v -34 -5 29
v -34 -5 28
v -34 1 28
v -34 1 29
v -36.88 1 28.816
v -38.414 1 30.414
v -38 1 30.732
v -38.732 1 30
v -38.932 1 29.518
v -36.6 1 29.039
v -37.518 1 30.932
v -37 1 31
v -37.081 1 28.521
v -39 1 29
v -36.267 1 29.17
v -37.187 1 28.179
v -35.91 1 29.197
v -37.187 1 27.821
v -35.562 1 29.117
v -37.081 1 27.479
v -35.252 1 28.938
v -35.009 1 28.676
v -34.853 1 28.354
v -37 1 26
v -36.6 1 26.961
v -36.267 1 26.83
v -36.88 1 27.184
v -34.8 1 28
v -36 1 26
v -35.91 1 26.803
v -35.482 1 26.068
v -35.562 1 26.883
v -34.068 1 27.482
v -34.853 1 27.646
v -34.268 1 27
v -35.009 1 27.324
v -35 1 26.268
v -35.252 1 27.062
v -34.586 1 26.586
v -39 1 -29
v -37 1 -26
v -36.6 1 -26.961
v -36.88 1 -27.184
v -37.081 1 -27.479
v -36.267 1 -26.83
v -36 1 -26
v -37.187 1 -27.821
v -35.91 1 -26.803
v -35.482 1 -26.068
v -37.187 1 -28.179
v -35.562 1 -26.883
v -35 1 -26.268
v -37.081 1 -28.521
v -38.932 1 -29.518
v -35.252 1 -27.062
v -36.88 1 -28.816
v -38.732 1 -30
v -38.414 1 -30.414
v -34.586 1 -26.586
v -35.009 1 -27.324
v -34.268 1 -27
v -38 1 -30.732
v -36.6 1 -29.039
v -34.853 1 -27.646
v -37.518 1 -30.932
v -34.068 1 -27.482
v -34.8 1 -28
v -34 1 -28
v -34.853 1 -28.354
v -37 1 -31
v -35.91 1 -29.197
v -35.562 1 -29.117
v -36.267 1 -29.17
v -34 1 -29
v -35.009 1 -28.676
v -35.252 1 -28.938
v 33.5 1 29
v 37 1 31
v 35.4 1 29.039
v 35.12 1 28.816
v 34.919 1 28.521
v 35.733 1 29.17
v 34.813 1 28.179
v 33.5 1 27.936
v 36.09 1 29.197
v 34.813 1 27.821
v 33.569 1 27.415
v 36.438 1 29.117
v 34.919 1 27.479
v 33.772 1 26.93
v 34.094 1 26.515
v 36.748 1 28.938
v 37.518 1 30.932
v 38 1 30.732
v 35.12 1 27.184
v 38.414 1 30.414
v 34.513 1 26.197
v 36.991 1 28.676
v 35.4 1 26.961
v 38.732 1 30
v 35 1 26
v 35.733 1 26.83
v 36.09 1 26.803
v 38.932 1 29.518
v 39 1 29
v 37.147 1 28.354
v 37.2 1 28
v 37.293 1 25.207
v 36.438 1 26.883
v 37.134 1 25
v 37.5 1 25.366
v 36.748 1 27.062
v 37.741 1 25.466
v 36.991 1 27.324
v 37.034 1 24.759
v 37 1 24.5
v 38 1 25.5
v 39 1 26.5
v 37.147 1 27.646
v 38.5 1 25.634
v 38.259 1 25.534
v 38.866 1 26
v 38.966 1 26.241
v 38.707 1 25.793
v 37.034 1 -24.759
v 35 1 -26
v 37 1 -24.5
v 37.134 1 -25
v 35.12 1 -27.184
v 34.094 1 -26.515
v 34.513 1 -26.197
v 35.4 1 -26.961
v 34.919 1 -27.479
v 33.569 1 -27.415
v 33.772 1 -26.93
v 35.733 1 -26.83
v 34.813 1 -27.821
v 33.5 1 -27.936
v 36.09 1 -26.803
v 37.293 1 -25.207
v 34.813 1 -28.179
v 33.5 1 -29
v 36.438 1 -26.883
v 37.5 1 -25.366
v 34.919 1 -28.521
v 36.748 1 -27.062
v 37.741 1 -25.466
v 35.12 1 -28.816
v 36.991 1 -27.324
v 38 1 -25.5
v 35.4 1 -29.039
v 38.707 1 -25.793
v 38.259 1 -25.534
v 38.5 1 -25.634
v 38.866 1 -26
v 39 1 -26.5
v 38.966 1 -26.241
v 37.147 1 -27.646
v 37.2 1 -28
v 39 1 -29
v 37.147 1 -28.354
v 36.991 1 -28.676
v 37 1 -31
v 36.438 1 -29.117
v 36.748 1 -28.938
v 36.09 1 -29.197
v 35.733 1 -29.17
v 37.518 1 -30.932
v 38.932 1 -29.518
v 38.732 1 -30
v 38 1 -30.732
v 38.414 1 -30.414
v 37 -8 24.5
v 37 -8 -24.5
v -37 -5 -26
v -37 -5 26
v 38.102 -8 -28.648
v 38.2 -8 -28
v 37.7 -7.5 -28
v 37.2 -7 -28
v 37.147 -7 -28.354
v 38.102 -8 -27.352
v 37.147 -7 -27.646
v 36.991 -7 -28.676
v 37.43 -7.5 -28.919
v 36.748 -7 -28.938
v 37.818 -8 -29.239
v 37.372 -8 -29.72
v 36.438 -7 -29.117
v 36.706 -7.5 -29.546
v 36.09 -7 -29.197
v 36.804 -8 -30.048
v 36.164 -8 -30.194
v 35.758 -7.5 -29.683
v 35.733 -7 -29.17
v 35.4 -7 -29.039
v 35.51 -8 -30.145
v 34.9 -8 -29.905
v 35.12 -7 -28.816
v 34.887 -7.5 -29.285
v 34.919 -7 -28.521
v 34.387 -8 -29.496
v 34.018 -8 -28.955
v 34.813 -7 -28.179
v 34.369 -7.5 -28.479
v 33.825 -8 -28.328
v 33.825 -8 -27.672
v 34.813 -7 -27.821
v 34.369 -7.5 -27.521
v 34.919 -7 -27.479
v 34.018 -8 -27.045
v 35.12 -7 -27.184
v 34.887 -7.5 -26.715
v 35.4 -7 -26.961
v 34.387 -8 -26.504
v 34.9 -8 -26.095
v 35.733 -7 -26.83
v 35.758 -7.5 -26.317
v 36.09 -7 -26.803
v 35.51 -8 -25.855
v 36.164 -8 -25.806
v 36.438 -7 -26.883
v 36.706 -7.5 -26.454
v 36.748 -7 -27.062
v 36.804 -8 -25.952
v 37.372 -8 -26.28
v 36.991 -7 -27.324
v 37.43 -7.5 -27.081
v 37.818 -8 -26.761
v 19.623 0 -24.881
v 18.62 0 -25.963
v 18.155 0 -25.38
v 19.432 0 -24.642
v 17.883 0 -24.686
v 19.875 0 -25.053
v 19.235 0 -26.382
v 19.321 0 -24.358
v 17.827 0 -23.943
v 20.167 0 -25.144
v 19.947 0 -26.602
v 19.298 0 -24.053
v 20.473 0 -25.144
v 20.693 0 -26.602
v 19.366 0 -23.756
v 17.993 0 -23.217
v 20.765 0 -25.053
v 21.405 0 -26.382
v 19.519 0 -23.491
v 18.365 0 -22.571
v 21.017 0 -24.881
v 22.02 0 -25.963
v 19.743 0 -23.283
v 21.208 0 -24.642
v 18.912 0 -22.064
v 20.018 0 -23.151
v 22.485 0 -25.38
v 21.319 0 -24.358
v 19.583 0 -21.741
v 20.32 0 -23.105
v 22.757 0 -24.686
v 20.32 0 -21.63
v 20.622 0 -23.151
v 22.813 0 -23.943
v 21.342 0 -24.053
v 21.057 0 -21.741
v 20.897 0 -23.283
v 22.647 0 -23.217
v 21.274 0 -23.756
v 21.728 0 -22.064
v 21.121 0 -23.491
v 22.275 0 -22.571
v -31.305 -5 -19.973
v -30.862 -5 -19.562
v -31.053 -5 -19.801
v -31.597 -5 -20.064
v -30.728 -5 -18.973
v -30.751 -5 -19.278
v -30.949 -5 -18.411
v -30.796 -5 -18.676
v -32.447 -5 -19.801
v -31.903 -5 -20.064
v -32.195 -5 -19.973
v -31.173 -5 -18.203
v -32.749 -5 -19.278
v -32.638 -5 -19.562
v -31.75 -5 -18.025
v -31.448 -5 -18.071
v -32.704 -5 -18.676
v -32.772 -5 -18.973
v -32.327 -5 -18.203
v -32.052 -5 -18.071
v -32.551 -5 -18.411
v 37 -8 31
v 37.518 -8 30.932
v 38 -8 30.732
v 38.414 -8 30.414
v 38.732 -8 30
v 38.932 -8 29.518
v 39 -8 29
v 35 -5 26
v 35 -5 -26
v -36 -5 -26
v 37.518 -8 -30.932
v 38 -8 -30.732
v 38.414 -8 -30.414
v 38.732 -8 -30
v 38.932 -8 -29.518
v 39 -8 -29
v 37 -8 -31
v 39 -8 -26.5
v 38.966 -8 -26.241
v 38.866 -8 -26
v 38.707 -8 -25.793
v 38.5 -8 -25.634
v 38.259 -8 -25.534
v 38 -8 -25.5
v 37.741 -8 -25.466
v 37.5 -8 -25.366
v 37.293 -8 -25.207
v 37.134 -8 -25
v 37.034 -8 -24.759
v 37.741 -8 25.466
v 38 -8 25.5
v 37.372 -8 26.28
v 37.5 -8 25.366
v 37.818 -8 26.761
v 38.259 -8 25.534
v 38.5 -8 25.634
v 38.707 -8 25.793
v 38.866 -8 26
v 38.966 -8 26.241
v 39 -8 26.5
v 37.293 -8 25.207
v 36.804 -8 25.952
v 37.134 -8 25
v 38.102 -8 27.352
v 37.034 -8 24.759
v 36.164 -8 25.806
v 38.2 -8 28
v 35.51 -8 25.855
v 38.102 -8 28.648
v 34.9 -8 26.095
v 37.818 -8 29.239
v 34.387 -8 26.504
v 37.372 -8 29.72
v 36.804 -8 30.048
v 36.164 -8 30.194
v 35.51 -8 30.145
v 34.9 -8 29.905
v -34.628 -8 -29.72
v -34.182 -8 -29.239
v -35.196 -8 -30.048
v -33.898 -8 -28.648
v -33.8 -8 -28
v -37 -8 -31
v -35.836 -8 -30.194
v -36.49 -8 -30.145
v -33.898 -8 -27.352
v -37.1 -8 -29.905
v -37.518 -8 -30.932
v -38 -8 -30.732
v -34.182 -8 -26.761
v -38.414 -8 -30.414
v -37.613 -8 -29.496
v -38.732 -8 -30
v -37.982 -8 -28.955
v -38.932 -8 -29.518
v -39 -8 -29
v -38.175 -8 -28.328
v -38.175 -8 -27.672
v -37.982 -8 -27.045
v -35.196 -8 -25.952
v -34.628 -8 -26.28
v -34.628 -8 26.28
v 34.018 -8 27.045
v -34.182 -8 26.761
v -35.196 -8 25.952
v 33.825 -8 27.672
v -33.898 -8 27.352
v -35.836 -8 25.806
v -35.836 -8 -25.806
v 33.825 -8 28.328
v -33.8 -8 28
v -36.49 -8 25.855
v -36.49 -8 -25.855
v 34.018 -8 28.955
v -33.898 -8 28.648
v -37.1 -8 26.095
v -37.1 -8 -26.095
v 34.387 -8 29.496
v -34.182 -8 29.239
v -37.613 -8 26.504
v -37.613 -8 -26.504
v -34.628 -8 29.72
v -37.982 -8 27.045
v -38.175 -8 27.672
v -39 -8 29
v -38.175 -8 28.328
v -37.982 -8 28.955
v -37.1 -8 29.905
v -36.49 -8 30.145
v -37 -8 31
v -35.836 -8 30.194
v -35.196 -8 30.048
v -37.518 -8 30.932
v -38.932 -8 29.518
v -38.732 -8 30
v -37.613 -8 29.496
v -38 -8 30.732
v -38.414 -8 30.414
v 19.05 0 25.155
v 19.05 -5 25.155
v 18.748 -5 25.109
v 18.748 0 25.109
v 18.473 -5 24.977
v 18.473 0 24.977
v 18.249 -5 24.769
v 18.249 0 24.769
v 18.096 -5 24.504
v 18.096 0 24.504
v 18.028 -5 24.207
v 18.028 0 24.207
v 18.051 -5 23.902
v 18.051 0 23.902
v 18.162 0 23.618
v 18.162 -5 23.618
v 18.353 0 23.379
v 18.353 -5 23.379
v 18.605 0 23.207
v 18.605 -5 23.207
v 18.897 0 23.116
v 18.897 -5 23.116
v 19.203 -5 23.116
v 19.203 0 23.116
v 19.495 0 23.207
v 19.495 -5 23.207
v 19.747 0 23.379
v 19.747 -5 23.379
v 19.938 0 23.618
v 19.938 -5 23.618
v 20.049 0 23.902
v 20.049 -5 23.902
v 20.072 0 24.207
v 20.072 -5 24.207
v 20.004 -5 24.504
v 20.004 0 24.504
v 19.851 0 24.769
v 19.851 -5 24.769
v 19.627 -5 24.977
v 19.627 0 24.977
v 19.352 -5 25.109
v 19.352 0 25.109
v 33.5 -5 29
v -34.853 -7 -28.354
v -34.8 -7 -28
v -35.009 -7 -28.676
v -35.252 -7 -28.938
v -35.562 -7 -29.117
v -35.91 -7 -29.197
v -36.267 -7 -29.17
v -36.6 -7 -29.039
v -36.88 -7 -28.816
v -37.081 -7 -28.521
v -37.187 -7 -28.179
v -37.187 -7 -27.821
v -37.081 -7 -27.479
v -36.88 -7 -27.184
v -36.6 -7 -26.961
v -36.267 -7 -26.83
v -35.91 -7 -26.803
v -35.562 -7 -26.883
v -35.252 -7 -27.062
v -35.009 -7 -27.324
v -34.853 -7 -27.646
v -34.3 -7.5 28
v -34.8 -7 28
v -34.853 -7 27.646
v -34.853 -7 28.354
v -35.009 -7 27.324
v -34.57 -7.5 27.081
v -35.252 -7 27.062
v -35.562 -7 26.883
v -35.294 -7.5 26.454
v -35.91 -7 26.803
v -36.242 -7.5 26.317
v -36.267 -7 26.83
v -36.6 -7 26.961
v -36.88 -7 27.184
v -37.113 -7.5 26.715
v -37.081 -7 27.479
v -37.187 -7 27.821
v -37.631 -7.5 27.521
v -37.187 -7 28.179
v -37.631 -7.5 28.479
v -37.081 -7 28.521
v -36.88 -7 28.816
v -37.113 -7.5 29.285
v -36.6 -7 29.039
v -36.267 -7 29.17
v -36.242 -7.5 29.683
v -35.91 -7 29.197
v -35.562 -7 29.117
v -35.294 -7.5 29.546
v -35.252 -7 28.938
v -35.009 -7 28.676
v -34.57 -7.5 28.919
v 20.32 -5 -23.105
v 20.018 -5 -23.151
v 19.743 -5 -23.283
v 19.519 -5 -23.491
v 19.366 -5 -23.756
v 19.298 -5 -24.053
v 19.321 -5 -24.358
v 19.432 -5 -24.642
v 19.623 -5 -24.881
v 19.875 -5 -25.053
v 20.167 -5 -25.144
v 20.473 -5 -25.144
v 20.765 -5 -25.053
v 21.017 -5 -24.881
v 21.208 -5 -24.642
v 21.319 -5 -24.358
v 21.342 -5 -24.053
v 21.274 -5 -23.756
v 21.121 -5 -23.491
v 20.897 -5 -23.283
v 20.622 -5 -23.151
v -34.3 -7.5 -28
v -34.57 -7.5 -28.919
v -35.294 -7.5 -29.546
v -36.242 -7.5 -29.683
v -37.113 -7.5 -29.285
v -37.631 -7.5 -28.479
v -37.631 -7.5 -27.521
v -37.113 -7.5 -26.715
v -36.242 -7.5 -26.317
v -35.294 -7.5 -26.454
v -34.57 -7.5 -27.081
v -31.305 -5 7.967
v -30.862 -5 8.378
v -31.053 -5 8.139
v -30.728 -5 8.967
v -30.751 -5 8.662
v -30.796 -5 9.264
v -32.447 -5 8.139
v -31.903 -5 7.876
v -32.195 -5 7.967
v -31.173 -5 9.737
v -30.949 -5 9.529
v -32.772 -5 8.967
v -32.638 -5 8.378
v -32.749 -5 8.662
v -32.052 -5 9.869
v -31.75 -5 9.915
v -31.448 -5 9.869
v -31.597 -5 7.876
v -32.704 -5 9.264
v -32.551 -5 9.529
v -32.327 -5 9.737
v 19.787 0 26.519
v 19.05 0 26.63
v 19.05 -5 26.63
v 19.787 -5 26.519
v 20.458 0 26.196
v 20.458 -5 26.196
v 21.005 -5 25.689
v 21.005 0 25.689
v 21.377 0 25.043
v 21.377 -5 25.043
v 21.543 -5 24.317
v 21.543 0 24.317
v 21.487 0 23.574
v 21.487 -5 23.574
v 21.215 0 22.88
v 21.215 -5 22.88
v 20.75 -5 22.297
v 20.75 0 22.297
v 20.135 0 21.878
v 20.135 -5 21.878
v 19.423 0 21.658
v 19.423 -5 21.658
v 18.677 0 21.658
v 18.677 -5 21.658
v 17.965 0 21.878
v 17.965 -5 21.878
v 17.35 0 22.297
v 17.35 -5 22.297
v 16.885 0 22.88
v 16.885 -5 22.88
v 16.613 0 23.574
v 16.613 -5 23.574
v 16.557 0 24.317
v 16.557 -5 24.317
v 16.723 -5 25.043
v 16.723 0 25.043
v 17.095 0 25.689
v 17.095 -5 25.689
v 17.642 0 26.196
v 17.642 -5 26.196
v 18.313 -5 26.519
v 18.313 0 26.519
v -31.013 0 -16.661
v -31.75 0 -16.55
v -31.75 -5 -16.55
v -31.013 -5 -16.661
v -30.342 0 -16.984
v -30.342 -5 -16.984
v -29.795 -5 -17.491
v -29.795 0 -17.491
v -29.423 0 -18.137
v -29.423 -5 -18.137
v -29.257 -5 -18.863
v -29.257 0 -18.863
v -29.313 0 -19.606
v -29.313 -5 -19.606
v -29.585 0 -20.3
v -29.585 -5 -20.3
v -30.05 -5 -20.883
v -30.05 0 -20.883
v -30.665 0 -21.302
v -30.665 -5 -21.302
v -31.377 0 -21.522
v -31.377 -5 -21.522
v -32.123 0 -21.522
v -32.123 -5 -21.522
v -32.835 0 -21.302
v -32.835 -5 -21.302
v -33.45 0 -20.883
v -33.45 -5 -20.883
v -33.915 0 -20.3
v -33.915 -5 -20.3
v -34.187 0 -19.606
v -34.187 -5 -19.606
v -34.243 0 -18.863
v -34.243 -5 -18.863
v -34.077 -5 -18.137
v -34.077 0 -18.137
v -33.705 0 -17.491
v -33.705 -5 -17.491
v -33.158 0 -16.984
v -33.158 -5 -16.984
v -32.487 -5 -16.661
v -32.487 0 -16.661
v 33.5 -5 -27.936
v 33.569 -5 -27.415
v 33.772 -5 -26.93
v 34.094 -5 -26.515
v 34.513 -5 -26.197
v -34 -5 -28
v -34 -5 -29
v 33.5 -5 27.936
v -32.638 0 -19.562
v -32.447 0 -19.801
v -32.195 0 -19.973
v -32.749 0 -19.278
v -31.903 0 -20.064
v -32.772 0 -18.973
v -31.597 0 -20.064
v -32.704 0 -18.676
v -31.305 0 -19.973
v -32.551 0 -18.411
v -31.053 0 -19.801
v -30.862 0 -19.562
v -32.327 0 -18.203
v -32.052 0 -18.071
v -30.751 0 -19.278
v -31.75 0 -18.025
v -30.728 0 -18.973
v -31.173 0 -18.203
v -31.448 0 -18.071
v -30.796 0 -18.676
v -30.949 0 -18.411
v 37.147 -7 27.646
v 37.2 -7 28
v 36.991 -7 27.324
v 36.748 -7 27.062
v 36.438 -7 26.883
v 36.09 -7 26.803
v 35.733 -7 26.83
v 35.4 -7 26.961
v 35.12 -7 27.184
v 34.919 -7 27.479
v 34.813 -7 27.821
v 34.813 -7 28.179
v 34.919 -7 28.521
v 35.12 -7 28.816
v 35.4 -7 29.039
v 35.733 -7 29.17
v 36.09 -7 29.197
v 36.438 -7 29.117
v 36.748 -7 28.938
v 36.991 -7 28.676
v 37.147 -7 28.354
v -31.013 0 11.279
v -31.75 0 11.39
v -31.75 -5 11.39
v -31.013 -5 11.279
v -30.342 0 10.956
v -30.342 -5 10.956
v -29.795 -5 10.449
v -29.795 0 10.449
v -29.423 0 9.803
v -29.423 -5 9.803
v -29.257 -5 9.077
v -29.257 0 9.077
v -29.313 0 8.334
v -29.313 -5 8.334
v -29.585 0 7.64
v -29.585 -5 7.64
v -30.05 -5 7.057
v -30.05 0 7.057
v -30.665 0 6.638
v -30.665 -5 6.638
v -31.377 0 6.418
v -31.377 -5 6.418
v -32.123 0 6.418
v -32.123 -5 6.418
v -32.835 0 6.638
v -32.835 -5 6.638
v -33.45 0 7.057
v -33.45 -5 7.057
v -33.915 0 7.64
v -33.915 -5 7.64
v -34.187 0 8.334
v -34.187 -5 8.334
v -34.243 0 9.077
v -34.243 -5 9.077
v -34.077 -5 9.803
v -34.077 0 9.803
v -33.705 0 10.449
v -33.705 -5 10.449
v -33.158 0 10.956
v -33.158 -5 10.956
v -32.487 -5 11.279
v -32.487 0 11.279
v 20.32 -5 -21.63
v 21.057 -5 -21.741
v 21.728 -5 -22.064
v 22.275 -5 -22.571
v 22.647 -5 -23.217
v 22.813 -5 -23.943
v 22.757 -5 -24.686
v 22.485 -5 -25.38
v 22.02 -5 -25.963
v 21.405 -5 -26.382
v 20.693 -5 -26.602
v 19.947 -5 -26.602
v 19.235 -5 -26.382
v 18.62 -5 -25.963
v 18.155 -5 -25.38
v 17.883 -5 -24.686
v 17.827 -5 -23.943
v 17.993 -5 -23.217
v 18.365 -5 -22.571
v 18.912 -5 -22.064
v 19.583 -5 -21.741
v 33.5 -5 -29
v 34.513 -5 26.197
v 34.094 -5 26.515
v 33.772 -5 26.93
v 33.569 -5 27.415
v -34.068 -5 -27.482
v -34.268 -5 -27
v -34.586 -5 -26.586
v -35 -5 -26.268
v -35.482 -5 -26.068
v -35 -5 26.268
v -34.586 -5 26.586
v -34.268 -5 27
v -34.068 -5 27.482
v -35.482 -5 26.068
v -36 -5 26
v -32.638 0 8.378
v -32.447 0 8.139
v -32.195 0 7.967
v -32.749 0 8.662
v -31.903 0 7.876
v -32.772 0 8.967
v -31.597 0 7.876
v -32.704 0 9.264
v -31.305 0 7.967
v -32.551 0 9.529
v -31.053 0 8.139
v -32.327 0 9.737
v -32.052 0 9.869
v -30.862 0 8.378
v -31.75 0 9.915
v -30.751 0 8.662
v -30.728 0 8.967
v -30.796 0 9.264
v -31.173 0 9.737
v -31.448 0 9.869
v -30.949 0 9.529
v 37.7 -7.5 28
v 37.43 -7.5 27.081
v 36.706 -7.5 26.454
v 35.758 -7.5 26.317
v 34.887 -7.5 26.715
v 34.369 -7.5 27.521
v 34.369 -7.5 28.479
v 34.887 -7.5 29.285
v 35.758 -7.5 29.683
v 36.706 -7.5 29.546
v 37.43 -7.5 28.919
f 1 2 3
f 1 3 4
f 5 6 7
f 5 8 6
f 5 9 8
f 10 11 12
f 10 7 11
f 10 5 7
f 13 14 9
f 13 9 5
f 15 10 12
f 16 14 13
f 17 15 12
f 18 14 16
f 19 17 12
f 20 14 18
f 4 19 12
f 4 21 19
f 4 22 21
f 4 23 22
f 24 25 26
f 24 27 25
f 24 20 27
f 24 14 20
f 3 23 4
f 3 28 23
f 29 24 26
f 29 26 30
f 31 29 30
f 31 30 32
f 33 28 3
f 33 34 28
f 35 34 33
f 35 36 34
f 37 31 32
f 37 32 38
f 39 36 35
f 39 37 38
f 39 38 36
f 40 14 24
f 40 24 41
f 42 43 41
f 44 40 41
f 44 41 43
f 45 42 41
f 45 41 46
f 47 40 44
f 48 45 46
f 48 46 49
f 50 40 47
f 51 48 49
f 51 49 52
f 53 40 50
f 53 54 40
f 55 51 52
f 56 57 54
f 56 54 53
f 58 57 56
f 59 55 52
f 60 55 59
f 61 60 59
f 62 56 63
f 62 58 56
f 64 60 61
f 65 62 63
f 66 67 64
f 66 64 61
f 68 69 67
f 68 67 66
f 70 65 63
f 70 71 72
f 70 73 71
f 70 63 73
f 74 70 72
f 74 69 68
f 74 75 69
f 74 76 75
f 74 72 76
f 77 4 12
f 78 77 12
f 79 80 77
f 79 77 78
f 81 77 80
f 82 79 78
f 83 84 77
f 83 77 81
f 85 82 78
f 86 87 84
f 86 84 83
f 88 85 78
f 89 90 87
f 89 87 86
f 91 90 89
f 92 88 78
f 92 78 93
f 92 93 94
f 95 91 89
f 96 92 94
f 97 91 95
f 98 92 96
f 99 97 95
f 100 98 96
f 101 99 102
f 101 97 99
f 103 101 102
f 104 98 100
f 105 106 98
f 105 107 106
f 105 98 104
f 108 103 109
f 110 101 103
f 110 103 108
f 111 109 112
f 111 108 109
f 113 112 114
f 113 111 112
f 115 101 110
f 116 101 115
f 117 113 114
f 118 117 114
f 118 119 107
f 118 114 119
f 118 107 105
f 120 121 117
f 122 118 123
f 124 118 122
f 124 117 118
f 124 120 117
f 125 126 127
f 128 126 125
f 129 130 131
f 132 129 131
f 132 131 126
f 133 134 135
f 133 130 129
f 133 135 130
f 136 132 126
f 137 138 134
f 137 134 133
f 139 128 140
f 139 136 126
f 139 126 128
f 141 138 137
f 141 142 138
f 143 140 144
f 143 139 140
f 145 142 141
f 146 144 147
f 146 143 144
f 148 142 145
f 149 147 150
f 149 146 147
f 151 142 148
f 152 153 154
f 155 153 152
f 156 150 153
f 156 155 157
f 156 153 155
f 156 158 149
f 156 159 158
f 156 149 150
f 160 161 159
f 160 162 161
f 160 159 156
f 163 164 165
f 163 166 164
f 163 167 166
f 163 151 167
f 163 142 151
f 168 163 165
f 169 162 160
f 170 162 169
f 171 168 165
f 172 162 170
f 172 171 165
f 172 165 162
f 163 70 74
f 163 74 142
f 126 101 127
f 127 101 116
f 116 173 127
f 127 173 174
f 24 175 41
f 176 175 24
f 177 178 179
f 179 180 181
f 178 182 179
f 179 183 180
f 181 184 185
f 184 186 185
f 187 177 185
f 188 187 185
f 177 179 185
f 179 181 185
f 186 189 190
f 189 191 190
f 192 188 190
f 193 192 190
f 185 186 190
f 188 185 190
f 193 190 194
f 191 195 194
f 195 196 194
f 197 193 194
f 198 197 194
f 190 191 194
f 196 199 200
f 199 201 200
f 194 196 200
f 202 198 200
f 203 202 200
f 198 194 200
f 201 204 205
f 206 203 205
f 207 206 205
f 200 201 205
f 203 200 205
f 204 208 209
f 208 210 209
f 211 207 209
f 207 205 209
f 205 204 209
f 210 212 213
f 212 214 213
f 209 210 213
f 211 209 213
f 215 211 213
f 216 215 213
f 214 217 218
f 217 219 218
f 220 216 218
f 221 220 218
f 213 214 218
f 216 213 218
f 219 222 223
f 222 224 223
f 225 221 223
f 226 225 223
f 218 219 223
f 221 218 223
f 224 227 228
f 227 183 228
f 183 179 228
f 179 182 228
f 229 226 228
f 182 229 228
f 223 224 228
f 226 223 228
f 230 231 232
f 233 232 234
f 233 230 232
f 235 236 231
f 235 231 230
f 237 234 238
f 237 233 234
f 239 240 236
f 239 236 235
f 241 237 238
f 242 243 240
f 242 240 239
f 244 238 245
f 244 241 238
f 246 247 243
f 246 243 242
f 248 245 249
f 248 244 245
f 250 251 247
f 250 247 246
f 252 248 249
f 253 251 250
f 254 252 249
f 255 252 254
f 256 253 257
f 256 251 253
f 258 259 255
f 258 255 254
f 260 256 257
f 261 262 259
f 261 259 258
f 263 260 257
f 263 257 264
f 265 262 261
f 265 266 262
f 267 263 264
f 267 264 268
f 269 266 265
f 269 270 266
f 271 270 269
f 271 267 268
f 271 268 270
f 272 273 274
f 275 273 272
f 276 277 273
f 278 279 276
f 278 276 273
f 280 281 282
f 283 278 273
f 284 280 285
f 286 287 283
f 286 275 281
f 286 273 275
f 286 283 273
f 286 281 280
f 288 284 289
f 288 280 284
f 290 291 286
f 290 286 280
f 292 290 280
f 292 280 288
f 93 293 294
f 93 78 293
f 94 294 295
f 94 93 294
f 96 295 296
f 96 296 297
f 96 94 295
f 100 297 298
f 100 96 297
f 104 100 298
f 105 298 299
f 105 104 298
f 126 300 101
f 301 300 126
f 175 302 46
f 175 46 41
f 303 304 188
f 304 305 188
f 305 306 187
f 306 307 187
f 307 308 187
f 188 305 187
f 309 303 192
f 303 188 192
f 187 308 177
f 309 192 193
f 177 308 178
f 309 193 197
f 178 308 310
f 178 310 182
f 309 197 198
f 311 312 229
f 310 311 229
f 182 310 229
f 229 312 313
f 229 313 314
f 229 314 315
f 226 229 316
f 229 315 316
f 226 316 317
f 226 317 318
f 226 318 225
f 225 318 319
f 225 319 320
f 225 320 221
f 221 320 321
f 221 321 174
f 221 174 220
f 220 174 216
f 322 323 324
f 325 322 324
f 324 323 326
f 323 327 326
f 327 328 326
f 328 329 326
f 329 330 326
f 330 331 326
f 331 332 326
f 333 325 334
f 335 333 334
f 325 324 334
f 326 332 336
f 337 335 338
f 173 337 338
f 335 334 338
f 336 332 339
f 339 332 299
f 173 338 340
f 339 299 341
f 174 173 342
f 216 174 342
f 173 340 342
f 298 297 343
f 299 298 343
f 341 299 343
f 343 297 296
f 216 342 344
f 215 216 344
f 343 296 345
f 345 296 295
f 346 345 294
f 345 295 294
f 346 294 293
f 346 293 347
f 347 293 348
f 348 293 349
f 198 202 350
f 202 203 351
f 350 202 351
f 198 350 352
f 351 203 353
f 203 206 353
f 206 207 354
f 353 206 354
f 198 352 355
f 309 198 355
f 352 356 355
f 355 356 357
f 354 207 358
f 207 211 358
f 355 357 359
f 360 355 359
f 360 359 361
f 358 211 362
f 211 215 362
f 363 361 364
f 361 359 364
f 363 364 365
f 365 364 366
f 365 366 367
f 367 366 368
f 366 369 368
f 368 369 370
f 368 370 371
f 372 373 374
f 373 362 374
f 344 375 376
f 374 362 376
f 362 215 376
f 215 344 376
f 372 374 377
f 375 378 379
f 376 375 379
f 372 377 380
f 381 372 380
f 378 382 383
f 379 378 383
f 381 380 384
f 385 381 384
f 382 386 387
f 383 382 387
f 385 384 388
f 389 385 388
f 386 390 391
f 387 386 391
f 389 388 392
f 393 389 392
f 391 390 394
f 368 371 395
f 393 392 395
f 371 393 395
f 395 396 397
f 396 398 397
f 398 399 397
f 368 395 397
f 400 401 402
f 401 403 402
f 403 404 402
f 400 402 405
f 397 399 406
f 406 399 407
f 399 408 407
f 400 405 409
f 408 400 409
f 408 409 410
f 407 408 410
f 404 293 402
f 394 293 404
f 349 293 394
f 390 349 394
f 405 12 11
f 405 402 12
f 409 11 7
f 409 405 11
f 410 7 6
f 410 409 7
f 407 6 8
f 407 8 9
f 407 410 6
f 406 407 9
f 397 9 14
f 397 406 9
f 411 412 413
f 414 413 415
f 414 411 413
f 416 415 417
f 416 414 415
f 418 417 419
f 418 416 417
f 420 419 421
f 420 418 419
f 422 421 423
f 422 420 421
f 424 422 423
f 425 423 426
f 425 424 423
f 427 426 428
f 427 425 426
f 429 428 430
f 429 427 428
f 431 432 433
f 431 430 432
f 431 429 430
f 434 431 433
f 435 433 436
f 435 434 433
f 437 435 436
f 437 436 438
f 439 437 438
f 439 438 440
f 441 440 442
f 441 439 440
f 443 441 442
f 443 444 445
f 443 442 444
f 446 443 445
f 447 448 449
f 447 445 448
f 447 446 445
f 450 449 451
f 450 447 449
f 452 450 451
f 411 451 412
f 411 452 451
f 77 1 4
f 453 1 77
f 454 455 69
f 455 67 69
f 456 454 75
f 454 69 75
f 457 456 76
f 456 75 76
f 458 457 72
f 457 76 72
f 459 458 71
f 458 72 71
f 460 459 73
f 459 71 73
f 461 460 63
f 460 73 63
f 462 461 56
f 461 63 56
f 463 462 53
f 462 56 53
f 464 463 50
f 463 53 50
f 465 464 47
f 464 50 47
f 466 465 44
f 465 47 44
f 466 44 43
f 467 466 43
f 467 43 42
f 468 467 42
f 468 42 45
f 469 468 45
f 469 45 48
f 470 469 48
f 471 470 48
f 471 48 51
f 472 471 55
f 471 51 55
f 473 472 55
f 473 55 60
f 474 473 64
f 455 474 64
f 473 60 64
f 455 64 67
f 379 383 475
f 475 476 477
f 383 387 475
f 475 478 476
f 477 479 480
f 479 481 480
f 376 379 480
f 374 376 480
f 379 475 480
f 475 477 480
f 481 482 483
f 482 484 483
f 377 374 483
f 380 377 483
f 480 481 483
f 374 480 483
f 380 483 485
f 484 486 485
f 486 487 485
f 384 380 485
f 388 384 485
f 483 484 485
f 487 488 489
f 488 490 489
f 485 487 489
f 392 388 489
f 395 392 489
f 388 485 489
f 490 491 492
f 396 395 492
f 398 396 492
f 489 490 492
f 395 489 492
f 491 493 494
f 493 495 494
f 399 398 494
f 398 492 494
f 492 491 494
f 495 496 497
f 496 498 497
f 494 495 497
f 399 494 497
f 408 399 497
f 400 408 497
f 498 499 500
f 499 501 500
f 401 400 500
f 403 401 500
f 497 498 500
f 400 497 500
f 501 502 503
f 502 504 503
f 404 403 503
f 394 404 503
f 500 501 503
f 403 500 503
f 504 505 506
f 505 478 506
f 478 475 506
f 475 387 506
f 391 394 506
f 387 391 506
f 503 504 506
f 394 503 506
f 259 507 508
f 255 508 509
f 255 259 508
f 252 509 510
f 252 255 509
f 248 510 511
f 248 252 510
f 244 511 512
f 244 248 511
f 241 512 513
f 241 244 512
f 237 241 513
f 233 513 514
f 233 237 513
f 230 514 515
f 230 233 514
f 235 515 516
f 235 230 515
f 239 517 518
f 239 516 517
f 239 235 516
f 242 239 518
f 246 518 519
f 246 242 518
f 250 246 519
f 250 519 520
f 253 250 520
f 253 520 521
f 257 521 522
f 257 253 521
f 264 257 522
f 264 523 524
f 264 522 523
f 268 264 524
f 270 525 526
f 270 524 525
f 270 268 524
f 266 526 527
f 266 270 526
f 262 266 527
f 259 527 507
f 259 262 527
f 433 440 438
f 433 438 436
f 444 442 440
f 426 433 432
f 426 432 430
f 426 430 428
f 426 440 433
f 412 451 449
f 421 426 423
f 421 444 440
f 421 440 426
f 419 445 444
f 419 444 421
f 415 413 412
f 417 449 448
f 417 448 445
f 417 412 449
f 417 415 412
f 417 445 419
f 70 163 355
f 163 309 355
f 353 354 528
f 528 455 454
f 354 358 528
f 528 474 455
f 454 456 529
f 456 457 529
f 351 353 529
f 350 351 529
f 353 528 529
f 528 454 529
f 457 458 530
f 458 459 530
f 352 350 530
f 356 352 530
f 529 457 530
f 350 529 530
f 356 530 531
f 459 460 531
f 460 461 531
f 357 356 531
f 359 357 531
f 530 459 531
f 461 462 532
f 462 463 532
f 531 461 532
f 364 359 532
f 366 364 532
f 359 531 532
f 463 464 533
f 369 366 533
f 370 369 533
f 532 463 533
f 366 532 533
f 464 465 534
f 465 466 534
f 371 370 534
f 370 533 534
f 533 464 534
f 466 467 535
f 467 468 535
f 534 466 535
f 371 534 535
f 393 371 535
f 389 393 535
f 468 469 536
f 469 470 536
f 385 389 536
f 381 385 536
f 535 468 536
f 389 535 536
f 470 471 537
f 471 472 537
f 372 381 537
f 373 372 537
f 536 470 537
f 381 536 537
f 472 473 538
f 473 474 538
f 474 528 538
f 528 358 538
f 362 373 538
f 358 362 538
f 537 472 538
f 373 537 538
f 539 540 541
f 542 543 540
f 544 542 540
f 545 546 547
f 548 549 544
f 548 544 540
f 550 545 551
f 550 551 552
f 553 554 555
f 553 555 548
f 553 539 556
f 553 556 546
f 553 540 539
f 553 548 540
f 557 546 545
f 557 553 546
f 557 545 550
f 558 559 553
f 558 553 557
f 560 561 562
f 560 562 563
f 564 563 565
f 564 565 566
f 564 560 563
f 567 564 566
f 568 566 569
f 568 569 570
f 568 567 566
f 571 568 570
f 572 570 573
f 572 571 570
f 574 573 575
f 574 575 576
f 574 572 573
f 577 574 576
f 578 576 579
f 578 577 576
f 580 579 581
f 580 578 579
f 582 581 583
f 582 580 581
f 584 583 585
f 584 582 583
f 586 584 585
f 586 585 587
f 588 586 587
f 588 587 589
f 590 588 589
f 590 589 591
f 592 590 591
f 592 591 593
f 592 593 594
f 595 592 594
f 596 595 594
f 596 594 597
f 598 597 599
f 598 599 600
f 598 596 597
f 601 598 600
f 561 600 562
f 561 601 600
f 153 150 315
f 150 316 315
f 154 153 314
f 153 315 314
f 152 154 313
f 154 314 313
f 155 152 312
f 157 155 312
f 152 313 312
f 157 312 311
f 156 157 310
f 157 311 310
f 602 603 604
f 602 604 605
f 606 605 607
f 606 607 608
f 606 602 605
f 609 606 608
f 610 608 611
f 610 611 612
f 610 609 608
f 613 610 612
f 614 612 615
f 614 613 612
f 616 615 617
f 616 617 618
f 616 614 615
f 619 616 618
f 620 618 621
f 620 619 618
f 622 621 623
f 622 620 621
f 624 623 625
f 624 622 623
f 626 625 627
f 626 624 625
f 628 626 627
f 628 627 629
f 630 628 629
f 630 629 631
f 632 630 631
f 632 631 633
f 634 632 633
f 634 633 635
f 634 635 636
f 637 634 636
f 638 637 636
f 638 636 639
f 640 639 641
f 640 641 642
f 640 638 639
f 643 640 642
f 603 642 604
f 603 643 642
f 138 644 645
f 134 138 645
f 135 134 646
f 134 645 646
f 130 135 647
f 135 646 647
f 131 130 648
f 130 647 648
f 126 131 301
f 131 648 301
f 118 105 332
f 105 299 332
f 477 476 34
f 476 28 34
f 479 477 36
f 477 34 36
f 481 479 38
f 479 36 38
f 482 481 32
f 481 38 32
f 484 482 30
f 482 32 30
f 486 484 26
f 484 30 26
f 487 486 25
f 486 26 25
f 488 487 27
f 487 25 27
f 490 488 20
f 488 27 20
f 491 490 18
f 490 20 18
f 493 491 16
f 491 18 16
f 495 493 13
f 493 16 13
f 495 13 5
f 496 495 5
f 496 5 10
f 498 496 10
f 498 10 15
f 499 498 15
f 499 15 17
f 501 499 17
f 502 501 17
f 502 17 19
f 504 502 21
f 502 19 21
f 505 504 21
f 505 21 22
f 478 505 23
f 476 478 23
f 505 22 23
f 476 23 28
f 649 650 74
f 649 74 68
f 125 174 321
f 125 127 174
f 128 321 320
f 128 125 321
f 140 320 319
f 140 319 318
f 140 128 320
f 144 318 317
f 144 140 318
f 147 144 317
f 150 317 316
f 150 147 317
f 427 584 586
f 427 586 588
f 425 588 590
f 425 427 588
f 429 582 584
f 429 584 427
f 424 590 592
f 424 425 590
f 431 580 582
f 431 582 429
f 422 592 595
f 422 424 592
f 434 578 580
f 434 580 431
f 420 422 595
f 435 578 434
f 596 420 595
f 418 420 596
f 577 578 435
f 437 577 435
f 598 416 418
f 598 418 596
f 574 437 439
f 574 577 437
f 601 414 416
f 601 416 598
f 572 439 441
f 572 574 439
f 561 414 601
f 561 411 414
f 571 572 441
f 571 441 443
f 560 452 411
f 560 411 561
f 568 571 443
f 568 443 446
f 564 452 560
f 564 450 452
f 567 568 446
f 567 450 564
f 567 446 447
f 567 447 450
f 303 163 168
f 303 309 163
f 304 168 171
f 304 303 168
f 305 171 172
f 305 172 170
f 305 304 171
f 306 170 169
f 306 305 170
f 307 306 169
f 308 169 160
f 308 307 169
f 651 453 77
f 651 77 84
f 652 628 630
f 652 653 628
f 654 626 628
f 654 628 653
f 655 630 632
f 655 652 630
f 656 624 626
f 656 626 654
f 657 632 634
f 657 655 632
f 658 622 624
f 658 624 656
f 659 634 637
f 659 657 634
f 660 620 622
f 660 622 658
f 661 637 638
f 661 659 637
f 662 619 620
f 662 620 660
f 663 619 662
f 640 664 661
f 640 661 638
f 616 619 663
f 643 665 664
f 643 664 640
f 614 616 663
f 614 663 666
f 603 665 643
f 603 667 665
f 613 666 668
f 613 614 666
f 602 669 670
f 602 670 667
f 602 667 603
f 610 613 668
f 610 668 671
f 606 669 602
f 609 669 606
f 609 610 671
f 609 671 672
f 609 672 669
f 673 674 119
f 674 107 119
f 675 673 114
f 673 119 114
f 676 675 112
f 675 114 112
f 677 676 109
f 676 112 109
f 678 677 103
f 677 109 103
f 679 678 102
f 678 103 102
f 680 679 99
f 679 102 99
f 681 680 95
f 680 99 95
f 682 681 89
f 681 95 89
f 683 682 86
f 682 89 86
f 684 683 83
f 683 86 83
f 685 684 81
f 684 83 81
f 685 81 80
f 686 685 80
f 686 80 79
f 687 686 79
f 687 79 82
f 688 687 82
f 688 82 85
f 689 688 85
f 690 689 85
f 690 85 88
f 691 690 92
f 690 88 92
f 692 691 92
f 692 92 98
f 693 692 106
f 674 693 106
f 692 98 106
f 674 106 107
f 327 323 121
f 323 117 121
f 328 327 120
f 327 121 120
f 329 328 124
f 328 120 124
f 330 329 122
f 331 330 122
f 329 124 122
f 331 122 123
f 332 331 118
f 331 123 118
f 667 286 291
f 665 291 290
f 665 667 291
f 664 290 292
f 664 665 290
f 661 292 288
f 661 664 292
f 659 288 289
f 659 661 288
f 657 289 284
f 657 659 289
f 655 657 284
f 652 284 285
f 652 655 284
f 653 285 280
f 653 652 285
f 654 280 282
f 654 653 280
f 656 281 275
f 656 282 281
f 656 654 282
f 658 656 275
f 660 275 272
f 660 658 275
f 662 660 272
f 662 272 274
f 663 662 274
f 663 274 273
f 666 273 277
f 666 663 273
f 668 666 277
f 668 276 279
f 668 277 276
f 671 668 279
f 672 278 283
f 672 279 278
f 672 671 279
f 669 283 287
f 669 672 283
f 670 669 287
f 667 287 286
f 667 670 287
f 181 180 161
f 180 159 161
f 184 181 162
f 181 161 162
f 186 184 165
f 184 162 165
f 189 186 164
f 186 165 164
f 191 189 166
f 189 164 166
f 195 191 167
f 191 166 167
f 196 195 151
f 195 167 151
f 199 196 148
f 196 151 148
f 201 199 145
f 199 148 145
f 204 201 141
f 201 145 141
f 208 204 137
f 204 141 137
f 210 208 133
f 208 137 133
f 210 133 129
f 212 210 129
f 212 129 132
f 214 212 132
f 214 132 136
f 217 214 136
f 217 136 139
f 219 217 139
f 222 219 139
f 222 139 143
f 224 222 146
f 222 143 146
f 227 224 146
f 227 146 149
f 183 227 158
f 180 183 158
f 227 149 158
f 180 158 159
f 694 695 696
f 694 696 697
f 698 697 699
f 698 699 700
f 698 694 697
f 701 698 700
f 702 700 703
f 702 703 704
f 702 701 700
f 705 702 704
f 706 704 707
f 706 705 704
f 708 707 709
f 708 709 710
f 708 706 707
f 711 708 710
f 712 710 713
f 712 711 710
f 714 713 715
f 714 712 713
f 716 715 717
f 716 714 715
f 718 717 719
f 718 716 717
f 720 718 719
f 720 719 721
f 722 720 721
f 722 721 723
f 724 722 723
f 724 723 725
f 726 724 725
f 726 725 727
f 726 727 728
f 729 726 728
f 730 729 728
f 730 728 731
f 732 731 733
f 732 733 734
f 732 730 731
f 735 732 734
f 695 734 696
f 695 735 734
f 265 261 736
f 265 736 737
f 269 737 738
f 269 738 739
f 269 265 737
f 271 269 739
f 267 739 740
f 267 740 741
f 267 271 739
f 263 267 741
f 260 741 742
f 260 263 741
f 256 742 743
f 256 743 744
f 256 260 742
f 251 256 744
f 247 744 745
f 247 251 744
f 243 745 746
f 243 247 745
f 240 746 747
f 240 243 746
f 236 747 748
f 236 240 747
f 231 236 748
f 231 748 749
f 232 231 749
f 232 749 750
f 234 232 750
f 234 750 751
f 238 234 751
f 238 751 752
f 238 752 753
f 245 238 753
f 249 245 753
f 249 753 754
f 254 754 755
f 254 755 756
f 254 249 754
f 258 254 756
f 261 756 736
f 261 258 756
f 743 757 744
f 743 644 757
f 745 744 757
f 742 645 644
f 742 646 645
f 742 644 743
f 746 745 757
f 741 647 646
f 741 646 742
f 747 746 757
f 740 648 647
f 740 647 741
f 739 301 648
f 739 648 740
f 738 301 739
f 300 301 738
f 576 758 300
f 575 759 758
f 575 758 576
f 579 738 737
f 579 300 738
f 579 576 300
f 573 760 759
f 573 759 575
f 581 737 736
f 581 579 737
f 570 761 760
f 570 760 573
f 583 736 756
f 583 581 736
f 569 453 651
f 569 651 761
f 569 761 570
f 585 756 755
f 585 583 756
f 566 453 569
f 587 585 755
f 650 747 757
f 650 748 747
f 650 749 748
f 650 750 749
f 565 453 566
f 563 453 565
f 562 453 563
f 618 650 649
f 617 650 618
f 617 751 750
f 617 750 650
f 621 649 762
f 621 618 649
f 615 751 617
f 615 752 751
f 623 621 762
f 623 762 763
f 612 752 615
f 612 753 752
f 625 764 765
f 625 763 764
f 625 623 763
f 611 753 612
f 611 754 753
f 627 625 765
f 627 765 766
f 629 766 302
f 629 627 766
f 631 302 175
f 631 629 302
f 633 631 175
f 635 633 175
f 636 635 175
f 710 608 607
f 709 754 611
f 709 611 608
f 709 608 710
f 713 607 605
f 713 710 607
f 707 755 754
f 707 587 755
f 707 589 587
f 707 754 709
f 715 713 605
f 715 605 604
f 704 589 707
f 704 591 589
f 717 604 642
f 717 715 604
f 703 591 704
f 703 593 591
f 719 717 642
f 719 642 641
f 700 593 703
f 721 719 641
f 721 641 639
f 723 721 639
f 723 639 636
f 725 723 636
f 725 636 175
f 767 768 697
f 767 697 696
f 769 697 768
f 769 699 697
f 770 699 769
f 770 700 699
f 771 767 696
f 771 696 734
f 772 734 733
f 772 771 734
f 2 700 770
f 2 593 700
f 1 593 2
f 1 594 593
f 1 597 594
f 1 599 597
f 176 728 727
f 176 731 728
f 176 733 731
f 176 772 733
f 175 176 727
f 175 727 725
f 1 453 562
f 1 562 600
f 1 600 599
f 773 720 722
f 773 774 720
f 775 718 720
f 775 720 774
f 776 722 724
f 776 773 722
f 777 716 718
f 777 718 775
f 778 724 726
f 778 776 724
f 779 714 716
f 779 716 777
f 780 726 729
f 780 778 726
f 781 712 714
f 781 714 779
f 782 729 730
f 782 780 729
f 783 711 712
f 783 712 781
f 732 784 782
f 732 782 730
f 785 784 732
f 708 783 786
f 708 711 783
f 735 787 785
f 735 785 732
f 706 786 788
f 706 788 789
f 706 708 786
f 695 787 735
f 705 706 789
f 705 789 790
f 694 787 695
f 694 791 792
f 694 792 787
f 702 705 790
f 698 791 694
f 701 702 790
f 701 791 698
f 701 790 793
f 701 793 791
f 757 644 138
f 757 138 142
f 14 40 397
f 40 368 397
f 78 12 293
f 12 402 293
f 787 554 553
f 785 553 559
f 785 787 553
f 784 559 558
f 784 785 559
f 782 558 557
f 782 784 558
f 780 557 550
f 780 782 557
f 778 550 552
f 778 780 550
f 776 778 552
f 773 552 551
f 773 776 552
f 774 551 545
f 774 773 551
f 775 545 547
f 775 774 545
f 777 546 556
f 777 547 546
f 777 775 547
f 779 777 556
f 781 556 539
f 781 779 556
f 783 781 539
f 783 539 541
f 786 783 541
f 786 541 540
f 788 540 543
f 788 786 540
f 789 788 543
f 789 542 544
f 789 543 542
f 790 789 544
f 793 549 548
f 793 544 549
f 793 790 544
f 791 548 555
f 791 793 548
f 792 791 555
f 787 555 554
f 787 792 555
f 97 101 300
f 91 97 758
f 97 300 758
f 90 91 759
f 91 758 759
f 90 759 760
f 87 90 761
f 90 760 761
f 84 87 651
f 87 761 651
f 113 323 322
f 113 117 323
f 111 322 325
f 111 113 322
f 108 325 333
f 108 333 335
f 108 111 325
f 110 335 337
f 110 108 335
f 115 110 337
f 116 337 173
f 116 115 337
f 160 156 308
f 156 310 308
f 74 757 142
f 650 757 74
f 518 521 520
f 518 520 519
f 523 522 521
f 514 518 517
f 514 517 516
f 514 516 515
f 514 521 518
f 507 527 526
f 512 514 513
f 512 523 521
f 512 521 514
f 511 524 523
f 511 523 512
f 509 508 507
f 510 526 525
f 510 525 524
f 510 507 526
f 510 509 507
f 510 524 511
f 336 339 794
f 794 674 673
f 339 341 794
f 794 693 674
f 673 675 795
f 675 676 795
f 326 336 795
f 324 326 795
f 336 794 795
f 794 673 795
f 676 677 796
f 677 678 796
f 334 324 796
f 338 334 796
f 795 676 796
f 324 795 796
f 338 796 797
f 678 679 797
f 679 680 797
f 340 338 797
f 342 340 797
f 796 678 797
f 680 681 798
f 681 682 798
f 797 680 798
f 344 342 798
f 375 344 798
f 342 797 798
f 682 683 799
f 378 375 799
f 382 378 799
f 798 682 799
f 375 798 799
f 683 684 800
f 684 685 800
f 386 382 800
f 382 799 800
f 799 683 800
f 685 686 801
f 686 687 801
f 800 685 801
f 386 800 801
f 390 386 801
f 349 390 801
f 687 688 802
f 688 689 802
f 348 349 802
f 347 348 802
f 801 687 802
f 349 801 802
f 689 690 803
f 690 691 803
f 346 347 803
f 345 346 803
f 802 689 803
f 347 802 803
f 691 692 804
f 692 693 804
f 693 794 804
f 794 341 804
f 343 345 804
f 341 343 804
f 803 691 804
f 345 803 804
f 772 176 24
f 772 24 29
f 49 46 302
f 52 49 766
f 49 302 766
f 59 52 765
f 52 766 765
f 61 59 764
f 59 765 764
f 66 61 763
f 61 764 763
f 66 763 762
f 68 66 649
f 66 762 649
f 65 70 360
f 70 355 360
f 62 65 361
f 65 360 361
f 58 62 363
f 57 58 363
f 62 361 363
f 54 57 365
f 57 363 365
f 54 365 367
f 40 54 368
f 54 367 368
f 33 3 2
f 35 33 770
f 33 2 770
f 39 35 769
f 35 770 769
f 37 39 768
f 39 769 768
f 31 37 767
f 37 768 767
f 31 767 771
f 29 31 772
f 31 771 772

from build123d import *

# Parameters (mm, degrees)
SKETCH1_R                                           = 2.5
BOSS_EXTRUDE1_DEPTH                                 = 5
BOSS_EXTRUDE1_2_DEPTH                               = 5
BOSS_EXTRUDE1_3_DEPTH                               = 5
BOSS_EXTRUDE1_4_DEPTH                               = 5
M2_5_TAPPED_HOLE1_AT_2_COUNT                        = 2
M2_5_TAPPED_HOLE1_AT_2_PITCH                        = 27.94
M2_5_TAPPED_HOLE1_AT_3_COUNT                        = 2
M2_5_TAPPED_HOLE1_AT_3_PITCH                        = 52.317218007
M2_5_TAPPED_HOLE1_AT_4_COUNT                        = 2
M2_5_TAPPED_HOLE1_AT_4_PITCH                        = 66.671976122
BOSS_EXTRUDE2_DEPTH                                 = 3
BOSS_EXTRUDE3_DEPTH                                 = 6
FILLET5_R                                           = 2
CSK_FOR_M2_COUNTERSUNK_FLAT_HEAD_SCREW1_D           = 2.4
CSK_FOR_M2_COUNTERSUNK_FLAT_HEAD_SCREW1_CSINK_D     = 4.4
CSK_FOR_M2_COUNTERSUNK_FLAT_HEAD_SCREW1_CSINK_ANGLE = 90
FILLET6_R                                           = 2
FILLET7_R                                           = 1


# Some blends are built 0.0001 mm under size
with BuildPart() as part:
    # Sketch1 → Boss-Extrude1 (new body)
    with BuildSketch(Plane(origin=(0, 0, 0), x_dir=(1, 0, 0), z_dir=(0, 1, 0))):
        with Locations(Location((-31.75, 19.05, 0), (0, 0, 270))):
            Circle(SKETCH1_R)
    extrude(amount=-BOSS_EXTRUDE1_DEPTH)

    # Sketch13 → M2.5 Tapped Hole1 (revolve, cut)
    with BuildSketch(Plane(origin=(-31.75, 0, -19.05), x_dir=(0, 0, 1), z_dir=(1, 0, 0))):
        Polygon((0, 0), (0, 6.965882135), (1.025, 6.35), (1.025, 0), align=None)
    m2_5_tapped_hole1 = revolve(axis=Axis((-31.75, 6.35, -19.05), (0, -1, 0)), mode=Mode.SUBTRACT)



with BuildPart() as body_2:
    # Sketch1 → Boss-Extrude1 2 (new body)
    with BuildSketch(Plane(origin=(0, 0, 0), x_dir=(1, 0, 0), z_dir=(0, 1, 0))):
        with Locations(Location((-31.75, -8.89, 0), (0, 0, 270))):
            Circle(SKETCH1_R)
    extrude(amount=-BOSS_EXTRUDE1_2_DEPTH)

    # M2.5 Tapped Hole1 at 2: M2.5 Tapped Hole1 ×2
    with Locations(*[(0, 0, i * M2_5_TAPPED_HOLE1_AT_2_PITCH) for i in range(1, M2_5_TAPPED_HOLE1_AT_2_COUNT)]):
        add(m2_5_tapped_hole1, mode=Mode.SUBTRACT)


with BuildPart() as body_3:
    # Sketch1 → Boss-Extrude1 3 (new body)
    with BuildSketch(Plane(origin=(0, 0, 0), x_dir=(1, 0, 0), z_dir=(0, 1, 0))):
        with Locations(Location((20.32, 24.13, 0), (0, 0, 270))):
            Circle(SKETCH1_R)
    extrude(amount=-BOSS_EXTRUDE1_3_DEPTH)

    # M2.5 Tapped Hole1 at 3: M2.5 Tapped Hole1 ×2
    with Locations(*[Vector(0.9952746339256161, 0, -0.097099964285426) * (i * M2_5_TAPPED_HOLE1_AT_3_PITCH) for i in range(1, M2_5_TAPPED_HOLE1_AT_3_COUNT)]):
        add(m2_5_tapped_hole1, mode=Mode.SUBTRACT)


with BuildPart() as body_4:
    # Sketch1 → Boss-Extrude1 4 (new body)
    with BuildSketch(Plane(origin=(0, 0, 0), x_dir=(1, 0, 0), z_dir=(0, 1, 0))):
        with Locations(Location((19.05, -24.13, 0), (0, 0, 270))):
            Circle(SKETCH1_R)
    extrude(amount=-BOSS_EXTRUDE1_4_DEPTH)

    # M2.5 Tapped Hole1 at 4: M2.5 Tapped Hole1 ×2
    with Locations(*[Vector(0.7619393177594593, 0, 0.6476484200955406) * (i * M2_5_TAPPED_HOLE1_AT_4_PITCH) for i in range(1, M2_5_TAPPED_HOLE1_AT_4_COUNT)]):
        add(m2_5_tapped_hole1, mode=Mode.SUBTRACT)


with BuildPart() as part_1:
    add(part.part)

    add(body_2.part)  # Boss-Extrude2 merges body 2

    add(body_3.part)  # Boss-Extrude2 merges body 3

    add(body_4.part)  # Boss-Extrude2 merges body 4
    # Sketch3 → Boss-Extrude2 (add)
    with BuildSketch(Plane.XZ.offset(5)):
        Polygon((-39, 31), (39, 31), (39, 25.5), (37, 25.5), (37, -25.5), (39, -25.5), (39, -31), (-39, -31), align=None)
    extrude(amount=BOSS_EXTRUDE2_DEPTH)

    # Sketch4 → Boss-Extrude3 (add)
    with BuildSketch(Plane(origin=(0, -5, 0), x_dir=(1, 0, 0), z_dir=(0, 1, 0))):
        Polygon((-39, -31), (39, -31), (39, -25.5), (37, -25.5), (37, 25.5), (39, 25.5), (39, 31), (-39, 31), align=None)
        Polygon((-34, -29), (33.5, -29), (33.5, -26), (35, -26), (35, 26), (33.5, 26), (33.5, 29), (-34, 29), (-34, 26), (-37, 26), (-37, -26), (-34, -26), align=None, mode=Mode.SUBTRACT)
    extrude(amount=BOSS_EXTRUDE3_DEPTH)

    # Fillet5
    # the kernel refuses this fillet: 2 mm, written as the material it takes off along each edge
    with BuildSketch(Plane(origin=(33.5, -5, 26), x_dir=(0, 0, 1), z_dir=(0, 1, 0))) as fillet5_piece_1:
        with BuildLine():
            CenterArc((1.936491673, 2), FILLET5_R, 194.477512186, 75.522487814)
            Line((0, 1.5), (-0.038729833, 1.49))
            ThreePointArc((-0.038729833, 1.49), (-0.04, 0.75), (-0.04, 0))
            Line((-0.04, 0), (0, -0.04))
            Line((0, -0.04), (1.936491673, -0.04))
            Line((1.936491673, -0.04), (1.936491673, 0))
        make_face()
    extrude(amount=10.841229183, mode=Mode.SUBTRACT)
    with BuildSketch(Plane(origin=(33.5, -5, -26), x_dir=(1, 0, 0), z_dir=(0, 1, 0))) as fillet5_piece_2:
        with BuildLine():
            CenterArc((2, 1.936491673), FILLET5_R, 180, 75.522487814)
            Line((0, 1.936491673), (-0.04, 1.936491673))
            Line((-0.04, 1.936491673), (-0.04, 0))
            Line((-0.04, 0), (0, -0.04))
            ThreePointArc((0, -0.04), (0.75, -0.04), (1.49, -0.038729833))
            Line((1.49, -0.038729833), (1.5, 0))
        make_face()
    extrude(amount=10.841229183, mode=Mode.SUBTRACT)
    with BuildSketch(Plane(origin=(-34, -5, -26), x_dir=(0, 0, -1), z_dir=(0, 1, 0)), Plane(origin=(-34, -5, 26), x_dir=(-1, 0, 0), z_dir=(0, 1, 0))) as fillet5_piece_3:
        with BuildLine():
            CenterArc((FILLET5_R, FILLET5_R), FILLET5_R, 180, 90)
            Line((0, FILLET5_R), (-FILLET5_R * 0.02, FILLET5_R))
            Line((-FILLET5_R * 0.02, FILLET5_R), (-FILLET5_R * 0.02, -FILLET5_R * 0.02))
            Line((-FILLET5_R * 0.02, -FILLET5_R * 0.02), (FILLET5_R, -FILLET5_R * 0.02))
            Line((FILLET5_R, -FILLET5_R * 0.02), (FILLET5_R, 0))
        make_face()
    extrude(amount=11, mode=Mode.SUBTRACT)

    # CSK for M2 Countersunk Flat Head Screw1 (through all)
    with Locations(Plane(origin=(0, -8, 0), x_dir=(-1, 0, 0), z_dir=(0, -1, 0))):
        with Locations((-36, 28), (36, 28), (36, -28), (-36, -28)):
            CounterSinkHole(CSK_FOR_M2_COUNTERSUNK_FLAT_HEAD_SCREW1_D / 2, CSK_FOR_M2_COUNTERSUNK_FLAT_HEAD_SCREW1_CSINK_D / 2, counter_sink_angle=CSK_FOR_M2_COUNTERSUNK_FLAT_HEAD_SCREW1_CSINK_ANGLE)

    # Fillet6
    fillet6_edges = [part_1.edges().sort_by_distance(p)[0] for p in [
        (39, -3.5, -31),
        (39, -3.5, 31),
        (-39, -3.5, 31),
        (-39, -3.5, -31),
    ]]
    fillet(fillet6_edges, radius=FILLET6_R)

    # Fillet7
    fillet7_edges = [part_1.edges().sort_by_distance(p)[0] for p in [
        (37, -3.5, -25.5),
        (37, -3.5, 25.5),
    ]]
    fillet(fillet7_edges, radius=FILLET7_R)
    fillet7_2_edges = [part_1.edges().sort_by_distance(p)[0] for p in [
        (39, -3.5, -25.5),
        (39, -3.5, 25.5),
    ]]
    fillet(fillet7_2_edges, radius=FILLET7_R - 0.0001)  # a hair under: the kernel refuses the full size


solid = part_1.part
